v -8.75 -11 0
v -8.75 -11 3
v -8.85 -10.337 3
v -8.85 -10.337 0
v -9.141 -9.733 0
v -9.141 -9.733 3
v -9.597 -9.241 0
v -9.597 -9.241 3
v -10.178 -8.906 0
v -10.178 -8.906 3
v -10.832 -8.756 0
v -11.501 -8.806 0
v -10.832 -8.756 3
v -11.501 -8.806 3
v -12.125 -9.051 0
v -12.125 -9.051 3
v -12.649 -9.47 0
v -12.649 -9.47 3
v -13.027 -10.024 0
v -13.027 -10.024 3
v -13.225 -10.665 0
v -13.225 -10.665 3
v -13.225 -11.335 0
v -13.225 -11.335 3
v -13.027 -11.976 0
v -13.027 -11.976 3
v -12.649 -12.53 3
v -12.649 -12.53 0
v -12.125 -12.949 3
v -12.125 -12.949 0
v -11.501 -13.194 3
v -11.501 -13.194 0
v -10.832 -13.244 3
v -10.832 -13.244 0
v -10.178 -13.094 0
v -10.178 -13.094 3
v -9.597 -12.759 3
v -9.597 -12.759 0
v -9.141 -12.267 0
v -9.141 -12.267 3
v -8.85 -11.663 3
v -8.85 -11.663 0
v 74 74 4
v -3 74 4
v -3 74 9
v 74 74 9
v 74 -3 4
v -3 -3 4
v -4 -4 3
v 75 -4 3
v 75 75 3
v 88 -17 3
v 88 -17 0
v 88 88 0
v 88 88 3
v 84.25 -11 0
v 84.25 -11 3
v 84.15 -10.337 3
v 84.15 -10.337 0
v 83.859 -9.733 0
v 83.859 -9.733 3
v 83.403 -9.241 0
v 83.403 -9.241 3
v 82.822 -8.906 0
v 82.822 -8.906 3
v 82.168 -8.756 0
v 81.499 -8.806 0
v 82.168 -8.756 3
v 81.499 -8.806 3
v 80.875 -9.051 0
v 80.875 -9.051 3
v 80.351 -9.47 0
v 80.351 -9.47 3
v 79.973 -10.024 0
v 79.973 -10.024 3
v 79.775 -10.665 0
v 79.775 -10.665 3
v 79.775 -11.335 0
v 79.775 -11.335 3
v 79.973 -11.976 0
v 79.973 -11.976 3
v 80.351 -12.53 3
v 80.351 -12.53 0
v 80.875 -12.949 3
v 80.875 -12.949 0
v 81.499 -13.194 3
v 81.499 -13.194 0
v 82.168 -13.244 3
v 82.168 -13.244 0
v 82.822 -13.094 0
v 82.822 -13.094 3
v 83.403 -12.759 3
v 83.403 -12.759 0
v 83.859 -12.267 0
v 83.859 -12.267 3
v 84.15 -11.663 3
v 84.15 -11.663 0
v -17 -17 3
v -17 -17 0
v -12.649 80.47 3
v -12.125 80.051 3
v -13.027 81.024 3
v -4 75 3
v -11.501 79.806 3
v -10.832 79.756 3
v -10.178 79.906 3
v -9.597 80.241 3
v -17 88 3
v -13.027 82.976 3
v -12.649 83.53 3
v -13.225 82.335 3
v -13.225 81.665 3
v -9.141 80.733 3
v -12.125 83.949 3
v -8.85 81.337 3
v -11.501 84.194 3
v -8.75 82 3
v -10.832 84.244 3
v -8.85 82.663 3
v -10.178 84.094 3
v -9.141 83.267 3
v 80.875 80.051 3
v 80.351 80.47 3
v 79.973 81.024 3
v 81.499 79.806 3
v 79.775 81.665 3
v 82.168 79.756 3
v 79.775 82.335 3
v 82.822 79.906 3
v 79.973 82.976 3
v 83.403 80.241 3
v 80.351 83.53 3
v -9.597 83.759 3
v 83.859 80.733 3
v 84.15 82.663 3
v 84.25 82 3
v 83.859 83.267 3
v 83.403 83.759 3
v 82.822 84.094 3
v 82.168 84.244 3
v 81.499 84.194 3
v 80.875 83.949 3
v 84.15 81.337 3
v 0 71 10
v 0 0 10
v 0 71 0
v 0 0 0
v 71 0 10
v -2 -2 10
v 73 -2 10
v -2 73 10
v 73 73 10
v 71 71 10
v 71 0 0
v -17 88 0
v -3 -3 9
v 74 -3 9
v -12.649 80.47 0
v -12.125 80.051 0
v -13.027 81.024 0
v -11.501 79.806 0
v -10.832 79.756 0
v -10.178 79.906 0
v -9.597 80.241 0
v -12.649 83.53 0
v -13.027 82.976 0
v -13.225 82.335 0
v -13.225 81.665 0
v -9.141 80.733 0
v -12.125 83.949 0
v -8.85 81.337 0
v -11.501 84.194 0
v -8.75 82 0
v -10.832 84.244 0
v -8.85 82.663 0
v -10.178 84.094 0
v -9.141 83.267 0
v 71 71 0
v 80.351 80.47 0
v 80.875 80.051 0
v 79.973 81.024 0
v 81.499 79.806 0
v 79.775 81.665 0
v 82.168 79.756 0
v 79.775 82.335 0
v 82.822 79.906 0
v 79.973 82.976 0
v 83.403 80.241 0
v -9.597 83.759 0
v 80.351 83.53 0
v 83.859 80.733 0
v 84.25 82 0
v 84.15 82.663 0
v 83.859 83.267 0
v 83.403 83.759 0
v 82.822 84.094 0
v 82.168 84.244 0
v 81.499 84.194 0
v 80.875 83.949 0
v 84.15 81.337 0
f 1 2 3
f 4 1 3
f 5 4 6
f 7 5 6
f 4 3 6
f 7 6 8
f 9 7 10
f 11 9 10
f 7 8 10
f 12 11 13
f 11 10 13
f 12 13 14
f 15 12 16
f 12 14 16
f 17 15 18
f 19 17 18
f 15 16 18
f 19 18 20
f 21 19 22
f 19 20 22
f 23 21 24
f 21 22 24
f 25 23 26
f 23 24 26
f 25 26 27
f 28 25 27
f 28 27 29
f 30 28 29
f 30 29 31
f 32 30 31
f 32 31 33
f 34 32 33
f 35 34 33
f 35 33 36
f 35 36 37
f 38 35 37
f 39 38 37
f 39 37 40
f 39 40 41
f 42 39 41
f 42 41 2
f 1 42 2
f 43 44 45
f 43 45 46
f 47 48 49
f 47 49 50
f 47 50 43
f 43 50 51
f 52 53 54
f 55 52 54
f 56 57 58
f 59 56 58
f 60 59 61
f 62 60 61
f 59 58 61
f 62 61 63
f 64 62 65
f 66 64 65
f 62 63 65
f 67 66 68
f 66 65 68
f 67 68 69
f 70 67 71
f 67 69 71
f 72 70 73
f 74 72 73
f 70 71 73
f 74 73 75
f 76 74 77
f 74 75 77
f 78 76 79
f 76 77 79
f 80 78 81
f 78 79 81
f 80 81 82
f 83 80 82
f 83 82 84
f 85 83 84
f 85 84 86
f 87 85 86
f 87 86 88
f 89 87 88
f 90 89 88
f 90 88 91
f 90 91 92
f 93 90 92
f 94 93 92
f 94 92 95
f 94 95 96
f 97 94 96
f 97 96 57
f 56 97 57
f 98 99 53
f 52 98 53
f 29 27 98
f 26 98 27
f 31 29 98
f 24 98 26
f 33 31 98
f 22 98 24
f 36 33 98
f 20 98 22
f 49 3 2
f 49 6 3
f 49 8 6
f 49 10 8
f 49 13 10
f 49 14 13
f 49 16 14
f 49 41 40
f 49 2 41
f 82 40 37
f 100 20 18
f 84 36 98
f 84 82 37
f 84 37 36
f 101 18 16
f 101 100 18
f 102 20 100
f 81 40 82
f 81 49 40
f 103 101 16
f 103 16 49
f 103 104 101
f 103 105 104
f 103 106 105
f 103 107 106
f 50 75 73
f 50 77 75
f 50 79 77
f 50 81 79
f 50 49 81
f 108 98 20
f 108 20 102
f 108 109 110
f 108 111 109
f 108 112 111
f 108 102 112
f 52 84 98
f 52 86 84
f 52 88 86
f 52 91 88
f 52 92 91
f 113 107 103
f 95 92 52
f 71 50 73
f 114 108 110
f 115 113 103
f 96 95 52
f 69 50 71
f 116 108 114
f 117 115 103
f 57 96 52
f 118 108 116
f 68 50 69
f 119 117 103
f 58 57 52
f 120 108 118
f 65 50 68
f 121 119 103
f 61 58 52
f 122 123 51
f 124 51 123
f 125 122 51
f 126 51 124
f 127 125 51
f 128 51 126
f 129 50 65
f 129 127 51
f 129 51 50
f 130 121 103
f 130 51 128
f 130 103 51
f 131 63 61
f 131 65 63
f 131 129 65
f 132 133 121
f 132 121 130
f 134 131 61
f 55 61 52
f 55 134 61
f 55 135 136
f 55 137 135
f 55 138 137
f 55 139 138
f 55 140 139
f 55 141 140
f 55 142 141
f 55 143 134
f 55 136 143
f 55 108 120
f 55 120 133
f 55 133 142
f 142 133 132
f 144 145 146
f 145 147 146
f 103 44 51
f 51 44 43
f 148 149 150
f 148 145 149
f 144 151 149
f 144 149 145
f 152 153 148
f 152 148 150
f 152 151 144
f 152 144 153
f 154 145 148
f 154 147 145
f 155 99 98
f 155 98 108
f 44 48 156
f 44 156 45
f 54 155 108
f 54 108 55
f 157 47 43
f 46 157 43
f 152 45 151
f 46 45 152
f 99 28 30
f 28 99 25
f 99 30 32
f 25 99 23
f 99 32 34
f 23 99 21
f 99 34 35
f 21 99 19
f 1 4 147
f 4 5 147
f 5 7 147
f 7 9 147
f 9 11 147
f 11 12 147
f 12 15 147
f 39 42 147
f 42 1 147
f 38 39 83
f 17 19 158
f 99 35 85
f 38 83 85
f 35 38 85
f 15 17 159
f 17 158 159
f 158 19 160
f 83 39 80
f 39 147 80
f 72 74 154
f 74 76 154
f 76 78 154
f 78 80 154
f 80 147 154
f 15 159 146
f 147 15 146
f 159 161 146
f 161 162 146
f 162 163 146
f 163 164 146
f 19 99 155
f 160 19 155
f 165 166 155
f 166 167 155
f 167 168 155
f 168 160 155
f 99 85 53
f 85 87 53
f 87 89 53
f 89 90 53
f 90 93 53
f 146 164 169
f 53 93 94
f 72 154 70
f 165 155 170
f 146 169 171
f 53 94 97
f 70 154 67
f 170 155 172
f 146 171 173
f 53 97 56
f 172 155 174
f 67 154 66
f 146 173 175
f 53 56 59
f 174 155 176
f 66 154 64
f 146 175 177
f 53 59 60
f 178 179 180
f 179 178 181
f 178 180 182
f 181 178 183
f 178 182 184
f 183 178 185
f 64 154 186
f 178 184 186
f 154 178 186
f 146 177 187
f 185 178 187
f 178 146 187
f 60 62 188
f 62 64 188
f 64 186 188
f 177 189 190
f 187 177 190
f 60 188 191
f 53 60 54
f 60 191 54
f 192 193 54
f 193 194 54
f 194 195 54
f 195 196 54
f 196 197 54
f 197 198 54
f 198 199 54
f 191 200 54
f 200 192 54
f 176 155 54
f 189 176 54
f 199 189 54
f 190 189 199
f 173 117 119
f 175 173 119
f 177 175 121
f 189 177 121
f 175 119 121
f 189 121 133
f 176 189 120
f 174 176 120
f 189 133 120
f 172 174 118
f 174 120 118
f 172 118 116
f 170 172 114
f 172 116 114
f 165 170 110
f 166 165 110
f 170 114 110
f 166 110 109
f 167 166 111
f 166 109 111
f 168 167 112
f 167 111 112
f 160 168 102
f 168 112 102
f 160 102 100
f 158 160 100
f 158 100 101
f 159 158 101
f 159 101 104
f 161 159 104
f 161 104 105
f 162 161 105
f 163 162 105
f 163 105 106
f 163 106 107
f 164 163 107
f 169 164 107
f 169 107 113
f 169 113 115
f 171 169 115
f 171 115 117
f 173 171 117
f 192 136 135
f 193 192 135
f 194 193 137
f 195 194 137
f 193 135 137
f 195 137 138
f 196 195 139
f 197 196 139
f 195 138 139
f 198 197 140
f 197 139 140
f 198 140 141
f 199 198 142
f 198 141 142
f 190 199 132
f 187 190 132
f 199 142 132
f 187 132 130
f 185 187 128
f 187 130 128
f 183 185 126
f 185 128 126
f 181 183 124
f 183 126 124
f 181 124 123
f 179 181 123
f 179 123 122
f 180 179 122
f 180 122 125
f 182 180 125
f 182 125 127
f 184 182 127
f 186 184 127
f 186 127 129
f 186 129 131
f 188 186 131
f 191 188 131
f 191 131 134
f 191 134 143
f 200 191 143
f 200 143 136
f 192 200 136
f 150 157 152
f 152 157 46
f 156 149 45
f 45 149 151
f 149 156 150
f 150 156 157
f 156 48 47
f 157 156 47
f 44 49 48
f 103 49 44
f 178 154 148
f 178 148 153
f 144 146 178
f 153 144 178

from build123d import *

# Parameters (mm, degrees)
SKETCH_1_W          = 105
SKETCH_1_H          = 105
SKETCH_1_W_2        = 71
SKETCH_1_H_2        = 71
EXTRUDE_1_DEPTH     = 3
SKETCH_2_W          = 77
SKETCH_2_H          = 77
SKETCH_2_W_2        = 71
SKETCH_2_H_2        = 71
EXTRUDE_2_DEPTH     = 7
CHAMFER_1_SIZE      = 1
SKETCH_4_R          = 2.25
CUT_EXTRUDE_1_DEPTH = 4


with BuildPart() as part:
    # Эскиз1 → Бобышка-Вытянуть1 (new body)
    with BuildSketch(Plane.XY):
        with Locations((35.5, 35.5)):
            Rectangle(SKETCH_1_W, SKETCH_1_H)
        with Locations((35.5, 35.5)):
            Rectangle(SKETCH_1_W_2, SKETCH_1_H_2, mode=Mode.SUBTRACT)
    extrude(amount=EXTRUDE_1_DEPTH)

    # Эскиз2 → Бобышка-Вытянуть2 (add)
    with BuildSketch(Plane.XY.offset(3)):
        with Locations((35.5, 35.5)):
            Rectangle(SKETCH_2_W, SKETCH_2_H)
        with Locations((35.5, 35.5)):
            Rectangle(SKETCH_2_W_2, SKETCH_2_H_2, mode=Mode.SUBTRACT)
    extrude(amount=EXTRUDE_2_DEPTH)

    # Фаска1
    chamfer_1_edges = [part.edges().sort_by_distance(p)[0] for p in [
        (-3, 35.5, 10),
        (35.5, -3, 10),
        (74, 35.5, 10),
        (35.5, 74, 10),
        (-3, 35.5, 3),
        (35.5, -3, 3),
        (74, 35.5, 3),
        (35.5, 74, 3),
    ]]
    chamfer(chamfer_1_edges, length=CHAMFER_1_SIZE)

    # Эскиз4 → Вырез-Вытянуть1 (cut, through all)
    with BuildSketch(Plane.XY.offset(3)):
        with Locations((-11, 82)):
            Circle(SKETCH_4_R)
        with Locations((82, 82)):
            Circle(SKETCH_4_R)
        with Locations((82, -11)):
            Circle(SKETCH_4_R)
        with Locations((-11, -11)):
            Circle(SKETCH_4_R)
    extrude(amount=-CUT_EXTRUDE_1_DEPTH, mode=Mode.SUBTRACT)


solid = part.part
